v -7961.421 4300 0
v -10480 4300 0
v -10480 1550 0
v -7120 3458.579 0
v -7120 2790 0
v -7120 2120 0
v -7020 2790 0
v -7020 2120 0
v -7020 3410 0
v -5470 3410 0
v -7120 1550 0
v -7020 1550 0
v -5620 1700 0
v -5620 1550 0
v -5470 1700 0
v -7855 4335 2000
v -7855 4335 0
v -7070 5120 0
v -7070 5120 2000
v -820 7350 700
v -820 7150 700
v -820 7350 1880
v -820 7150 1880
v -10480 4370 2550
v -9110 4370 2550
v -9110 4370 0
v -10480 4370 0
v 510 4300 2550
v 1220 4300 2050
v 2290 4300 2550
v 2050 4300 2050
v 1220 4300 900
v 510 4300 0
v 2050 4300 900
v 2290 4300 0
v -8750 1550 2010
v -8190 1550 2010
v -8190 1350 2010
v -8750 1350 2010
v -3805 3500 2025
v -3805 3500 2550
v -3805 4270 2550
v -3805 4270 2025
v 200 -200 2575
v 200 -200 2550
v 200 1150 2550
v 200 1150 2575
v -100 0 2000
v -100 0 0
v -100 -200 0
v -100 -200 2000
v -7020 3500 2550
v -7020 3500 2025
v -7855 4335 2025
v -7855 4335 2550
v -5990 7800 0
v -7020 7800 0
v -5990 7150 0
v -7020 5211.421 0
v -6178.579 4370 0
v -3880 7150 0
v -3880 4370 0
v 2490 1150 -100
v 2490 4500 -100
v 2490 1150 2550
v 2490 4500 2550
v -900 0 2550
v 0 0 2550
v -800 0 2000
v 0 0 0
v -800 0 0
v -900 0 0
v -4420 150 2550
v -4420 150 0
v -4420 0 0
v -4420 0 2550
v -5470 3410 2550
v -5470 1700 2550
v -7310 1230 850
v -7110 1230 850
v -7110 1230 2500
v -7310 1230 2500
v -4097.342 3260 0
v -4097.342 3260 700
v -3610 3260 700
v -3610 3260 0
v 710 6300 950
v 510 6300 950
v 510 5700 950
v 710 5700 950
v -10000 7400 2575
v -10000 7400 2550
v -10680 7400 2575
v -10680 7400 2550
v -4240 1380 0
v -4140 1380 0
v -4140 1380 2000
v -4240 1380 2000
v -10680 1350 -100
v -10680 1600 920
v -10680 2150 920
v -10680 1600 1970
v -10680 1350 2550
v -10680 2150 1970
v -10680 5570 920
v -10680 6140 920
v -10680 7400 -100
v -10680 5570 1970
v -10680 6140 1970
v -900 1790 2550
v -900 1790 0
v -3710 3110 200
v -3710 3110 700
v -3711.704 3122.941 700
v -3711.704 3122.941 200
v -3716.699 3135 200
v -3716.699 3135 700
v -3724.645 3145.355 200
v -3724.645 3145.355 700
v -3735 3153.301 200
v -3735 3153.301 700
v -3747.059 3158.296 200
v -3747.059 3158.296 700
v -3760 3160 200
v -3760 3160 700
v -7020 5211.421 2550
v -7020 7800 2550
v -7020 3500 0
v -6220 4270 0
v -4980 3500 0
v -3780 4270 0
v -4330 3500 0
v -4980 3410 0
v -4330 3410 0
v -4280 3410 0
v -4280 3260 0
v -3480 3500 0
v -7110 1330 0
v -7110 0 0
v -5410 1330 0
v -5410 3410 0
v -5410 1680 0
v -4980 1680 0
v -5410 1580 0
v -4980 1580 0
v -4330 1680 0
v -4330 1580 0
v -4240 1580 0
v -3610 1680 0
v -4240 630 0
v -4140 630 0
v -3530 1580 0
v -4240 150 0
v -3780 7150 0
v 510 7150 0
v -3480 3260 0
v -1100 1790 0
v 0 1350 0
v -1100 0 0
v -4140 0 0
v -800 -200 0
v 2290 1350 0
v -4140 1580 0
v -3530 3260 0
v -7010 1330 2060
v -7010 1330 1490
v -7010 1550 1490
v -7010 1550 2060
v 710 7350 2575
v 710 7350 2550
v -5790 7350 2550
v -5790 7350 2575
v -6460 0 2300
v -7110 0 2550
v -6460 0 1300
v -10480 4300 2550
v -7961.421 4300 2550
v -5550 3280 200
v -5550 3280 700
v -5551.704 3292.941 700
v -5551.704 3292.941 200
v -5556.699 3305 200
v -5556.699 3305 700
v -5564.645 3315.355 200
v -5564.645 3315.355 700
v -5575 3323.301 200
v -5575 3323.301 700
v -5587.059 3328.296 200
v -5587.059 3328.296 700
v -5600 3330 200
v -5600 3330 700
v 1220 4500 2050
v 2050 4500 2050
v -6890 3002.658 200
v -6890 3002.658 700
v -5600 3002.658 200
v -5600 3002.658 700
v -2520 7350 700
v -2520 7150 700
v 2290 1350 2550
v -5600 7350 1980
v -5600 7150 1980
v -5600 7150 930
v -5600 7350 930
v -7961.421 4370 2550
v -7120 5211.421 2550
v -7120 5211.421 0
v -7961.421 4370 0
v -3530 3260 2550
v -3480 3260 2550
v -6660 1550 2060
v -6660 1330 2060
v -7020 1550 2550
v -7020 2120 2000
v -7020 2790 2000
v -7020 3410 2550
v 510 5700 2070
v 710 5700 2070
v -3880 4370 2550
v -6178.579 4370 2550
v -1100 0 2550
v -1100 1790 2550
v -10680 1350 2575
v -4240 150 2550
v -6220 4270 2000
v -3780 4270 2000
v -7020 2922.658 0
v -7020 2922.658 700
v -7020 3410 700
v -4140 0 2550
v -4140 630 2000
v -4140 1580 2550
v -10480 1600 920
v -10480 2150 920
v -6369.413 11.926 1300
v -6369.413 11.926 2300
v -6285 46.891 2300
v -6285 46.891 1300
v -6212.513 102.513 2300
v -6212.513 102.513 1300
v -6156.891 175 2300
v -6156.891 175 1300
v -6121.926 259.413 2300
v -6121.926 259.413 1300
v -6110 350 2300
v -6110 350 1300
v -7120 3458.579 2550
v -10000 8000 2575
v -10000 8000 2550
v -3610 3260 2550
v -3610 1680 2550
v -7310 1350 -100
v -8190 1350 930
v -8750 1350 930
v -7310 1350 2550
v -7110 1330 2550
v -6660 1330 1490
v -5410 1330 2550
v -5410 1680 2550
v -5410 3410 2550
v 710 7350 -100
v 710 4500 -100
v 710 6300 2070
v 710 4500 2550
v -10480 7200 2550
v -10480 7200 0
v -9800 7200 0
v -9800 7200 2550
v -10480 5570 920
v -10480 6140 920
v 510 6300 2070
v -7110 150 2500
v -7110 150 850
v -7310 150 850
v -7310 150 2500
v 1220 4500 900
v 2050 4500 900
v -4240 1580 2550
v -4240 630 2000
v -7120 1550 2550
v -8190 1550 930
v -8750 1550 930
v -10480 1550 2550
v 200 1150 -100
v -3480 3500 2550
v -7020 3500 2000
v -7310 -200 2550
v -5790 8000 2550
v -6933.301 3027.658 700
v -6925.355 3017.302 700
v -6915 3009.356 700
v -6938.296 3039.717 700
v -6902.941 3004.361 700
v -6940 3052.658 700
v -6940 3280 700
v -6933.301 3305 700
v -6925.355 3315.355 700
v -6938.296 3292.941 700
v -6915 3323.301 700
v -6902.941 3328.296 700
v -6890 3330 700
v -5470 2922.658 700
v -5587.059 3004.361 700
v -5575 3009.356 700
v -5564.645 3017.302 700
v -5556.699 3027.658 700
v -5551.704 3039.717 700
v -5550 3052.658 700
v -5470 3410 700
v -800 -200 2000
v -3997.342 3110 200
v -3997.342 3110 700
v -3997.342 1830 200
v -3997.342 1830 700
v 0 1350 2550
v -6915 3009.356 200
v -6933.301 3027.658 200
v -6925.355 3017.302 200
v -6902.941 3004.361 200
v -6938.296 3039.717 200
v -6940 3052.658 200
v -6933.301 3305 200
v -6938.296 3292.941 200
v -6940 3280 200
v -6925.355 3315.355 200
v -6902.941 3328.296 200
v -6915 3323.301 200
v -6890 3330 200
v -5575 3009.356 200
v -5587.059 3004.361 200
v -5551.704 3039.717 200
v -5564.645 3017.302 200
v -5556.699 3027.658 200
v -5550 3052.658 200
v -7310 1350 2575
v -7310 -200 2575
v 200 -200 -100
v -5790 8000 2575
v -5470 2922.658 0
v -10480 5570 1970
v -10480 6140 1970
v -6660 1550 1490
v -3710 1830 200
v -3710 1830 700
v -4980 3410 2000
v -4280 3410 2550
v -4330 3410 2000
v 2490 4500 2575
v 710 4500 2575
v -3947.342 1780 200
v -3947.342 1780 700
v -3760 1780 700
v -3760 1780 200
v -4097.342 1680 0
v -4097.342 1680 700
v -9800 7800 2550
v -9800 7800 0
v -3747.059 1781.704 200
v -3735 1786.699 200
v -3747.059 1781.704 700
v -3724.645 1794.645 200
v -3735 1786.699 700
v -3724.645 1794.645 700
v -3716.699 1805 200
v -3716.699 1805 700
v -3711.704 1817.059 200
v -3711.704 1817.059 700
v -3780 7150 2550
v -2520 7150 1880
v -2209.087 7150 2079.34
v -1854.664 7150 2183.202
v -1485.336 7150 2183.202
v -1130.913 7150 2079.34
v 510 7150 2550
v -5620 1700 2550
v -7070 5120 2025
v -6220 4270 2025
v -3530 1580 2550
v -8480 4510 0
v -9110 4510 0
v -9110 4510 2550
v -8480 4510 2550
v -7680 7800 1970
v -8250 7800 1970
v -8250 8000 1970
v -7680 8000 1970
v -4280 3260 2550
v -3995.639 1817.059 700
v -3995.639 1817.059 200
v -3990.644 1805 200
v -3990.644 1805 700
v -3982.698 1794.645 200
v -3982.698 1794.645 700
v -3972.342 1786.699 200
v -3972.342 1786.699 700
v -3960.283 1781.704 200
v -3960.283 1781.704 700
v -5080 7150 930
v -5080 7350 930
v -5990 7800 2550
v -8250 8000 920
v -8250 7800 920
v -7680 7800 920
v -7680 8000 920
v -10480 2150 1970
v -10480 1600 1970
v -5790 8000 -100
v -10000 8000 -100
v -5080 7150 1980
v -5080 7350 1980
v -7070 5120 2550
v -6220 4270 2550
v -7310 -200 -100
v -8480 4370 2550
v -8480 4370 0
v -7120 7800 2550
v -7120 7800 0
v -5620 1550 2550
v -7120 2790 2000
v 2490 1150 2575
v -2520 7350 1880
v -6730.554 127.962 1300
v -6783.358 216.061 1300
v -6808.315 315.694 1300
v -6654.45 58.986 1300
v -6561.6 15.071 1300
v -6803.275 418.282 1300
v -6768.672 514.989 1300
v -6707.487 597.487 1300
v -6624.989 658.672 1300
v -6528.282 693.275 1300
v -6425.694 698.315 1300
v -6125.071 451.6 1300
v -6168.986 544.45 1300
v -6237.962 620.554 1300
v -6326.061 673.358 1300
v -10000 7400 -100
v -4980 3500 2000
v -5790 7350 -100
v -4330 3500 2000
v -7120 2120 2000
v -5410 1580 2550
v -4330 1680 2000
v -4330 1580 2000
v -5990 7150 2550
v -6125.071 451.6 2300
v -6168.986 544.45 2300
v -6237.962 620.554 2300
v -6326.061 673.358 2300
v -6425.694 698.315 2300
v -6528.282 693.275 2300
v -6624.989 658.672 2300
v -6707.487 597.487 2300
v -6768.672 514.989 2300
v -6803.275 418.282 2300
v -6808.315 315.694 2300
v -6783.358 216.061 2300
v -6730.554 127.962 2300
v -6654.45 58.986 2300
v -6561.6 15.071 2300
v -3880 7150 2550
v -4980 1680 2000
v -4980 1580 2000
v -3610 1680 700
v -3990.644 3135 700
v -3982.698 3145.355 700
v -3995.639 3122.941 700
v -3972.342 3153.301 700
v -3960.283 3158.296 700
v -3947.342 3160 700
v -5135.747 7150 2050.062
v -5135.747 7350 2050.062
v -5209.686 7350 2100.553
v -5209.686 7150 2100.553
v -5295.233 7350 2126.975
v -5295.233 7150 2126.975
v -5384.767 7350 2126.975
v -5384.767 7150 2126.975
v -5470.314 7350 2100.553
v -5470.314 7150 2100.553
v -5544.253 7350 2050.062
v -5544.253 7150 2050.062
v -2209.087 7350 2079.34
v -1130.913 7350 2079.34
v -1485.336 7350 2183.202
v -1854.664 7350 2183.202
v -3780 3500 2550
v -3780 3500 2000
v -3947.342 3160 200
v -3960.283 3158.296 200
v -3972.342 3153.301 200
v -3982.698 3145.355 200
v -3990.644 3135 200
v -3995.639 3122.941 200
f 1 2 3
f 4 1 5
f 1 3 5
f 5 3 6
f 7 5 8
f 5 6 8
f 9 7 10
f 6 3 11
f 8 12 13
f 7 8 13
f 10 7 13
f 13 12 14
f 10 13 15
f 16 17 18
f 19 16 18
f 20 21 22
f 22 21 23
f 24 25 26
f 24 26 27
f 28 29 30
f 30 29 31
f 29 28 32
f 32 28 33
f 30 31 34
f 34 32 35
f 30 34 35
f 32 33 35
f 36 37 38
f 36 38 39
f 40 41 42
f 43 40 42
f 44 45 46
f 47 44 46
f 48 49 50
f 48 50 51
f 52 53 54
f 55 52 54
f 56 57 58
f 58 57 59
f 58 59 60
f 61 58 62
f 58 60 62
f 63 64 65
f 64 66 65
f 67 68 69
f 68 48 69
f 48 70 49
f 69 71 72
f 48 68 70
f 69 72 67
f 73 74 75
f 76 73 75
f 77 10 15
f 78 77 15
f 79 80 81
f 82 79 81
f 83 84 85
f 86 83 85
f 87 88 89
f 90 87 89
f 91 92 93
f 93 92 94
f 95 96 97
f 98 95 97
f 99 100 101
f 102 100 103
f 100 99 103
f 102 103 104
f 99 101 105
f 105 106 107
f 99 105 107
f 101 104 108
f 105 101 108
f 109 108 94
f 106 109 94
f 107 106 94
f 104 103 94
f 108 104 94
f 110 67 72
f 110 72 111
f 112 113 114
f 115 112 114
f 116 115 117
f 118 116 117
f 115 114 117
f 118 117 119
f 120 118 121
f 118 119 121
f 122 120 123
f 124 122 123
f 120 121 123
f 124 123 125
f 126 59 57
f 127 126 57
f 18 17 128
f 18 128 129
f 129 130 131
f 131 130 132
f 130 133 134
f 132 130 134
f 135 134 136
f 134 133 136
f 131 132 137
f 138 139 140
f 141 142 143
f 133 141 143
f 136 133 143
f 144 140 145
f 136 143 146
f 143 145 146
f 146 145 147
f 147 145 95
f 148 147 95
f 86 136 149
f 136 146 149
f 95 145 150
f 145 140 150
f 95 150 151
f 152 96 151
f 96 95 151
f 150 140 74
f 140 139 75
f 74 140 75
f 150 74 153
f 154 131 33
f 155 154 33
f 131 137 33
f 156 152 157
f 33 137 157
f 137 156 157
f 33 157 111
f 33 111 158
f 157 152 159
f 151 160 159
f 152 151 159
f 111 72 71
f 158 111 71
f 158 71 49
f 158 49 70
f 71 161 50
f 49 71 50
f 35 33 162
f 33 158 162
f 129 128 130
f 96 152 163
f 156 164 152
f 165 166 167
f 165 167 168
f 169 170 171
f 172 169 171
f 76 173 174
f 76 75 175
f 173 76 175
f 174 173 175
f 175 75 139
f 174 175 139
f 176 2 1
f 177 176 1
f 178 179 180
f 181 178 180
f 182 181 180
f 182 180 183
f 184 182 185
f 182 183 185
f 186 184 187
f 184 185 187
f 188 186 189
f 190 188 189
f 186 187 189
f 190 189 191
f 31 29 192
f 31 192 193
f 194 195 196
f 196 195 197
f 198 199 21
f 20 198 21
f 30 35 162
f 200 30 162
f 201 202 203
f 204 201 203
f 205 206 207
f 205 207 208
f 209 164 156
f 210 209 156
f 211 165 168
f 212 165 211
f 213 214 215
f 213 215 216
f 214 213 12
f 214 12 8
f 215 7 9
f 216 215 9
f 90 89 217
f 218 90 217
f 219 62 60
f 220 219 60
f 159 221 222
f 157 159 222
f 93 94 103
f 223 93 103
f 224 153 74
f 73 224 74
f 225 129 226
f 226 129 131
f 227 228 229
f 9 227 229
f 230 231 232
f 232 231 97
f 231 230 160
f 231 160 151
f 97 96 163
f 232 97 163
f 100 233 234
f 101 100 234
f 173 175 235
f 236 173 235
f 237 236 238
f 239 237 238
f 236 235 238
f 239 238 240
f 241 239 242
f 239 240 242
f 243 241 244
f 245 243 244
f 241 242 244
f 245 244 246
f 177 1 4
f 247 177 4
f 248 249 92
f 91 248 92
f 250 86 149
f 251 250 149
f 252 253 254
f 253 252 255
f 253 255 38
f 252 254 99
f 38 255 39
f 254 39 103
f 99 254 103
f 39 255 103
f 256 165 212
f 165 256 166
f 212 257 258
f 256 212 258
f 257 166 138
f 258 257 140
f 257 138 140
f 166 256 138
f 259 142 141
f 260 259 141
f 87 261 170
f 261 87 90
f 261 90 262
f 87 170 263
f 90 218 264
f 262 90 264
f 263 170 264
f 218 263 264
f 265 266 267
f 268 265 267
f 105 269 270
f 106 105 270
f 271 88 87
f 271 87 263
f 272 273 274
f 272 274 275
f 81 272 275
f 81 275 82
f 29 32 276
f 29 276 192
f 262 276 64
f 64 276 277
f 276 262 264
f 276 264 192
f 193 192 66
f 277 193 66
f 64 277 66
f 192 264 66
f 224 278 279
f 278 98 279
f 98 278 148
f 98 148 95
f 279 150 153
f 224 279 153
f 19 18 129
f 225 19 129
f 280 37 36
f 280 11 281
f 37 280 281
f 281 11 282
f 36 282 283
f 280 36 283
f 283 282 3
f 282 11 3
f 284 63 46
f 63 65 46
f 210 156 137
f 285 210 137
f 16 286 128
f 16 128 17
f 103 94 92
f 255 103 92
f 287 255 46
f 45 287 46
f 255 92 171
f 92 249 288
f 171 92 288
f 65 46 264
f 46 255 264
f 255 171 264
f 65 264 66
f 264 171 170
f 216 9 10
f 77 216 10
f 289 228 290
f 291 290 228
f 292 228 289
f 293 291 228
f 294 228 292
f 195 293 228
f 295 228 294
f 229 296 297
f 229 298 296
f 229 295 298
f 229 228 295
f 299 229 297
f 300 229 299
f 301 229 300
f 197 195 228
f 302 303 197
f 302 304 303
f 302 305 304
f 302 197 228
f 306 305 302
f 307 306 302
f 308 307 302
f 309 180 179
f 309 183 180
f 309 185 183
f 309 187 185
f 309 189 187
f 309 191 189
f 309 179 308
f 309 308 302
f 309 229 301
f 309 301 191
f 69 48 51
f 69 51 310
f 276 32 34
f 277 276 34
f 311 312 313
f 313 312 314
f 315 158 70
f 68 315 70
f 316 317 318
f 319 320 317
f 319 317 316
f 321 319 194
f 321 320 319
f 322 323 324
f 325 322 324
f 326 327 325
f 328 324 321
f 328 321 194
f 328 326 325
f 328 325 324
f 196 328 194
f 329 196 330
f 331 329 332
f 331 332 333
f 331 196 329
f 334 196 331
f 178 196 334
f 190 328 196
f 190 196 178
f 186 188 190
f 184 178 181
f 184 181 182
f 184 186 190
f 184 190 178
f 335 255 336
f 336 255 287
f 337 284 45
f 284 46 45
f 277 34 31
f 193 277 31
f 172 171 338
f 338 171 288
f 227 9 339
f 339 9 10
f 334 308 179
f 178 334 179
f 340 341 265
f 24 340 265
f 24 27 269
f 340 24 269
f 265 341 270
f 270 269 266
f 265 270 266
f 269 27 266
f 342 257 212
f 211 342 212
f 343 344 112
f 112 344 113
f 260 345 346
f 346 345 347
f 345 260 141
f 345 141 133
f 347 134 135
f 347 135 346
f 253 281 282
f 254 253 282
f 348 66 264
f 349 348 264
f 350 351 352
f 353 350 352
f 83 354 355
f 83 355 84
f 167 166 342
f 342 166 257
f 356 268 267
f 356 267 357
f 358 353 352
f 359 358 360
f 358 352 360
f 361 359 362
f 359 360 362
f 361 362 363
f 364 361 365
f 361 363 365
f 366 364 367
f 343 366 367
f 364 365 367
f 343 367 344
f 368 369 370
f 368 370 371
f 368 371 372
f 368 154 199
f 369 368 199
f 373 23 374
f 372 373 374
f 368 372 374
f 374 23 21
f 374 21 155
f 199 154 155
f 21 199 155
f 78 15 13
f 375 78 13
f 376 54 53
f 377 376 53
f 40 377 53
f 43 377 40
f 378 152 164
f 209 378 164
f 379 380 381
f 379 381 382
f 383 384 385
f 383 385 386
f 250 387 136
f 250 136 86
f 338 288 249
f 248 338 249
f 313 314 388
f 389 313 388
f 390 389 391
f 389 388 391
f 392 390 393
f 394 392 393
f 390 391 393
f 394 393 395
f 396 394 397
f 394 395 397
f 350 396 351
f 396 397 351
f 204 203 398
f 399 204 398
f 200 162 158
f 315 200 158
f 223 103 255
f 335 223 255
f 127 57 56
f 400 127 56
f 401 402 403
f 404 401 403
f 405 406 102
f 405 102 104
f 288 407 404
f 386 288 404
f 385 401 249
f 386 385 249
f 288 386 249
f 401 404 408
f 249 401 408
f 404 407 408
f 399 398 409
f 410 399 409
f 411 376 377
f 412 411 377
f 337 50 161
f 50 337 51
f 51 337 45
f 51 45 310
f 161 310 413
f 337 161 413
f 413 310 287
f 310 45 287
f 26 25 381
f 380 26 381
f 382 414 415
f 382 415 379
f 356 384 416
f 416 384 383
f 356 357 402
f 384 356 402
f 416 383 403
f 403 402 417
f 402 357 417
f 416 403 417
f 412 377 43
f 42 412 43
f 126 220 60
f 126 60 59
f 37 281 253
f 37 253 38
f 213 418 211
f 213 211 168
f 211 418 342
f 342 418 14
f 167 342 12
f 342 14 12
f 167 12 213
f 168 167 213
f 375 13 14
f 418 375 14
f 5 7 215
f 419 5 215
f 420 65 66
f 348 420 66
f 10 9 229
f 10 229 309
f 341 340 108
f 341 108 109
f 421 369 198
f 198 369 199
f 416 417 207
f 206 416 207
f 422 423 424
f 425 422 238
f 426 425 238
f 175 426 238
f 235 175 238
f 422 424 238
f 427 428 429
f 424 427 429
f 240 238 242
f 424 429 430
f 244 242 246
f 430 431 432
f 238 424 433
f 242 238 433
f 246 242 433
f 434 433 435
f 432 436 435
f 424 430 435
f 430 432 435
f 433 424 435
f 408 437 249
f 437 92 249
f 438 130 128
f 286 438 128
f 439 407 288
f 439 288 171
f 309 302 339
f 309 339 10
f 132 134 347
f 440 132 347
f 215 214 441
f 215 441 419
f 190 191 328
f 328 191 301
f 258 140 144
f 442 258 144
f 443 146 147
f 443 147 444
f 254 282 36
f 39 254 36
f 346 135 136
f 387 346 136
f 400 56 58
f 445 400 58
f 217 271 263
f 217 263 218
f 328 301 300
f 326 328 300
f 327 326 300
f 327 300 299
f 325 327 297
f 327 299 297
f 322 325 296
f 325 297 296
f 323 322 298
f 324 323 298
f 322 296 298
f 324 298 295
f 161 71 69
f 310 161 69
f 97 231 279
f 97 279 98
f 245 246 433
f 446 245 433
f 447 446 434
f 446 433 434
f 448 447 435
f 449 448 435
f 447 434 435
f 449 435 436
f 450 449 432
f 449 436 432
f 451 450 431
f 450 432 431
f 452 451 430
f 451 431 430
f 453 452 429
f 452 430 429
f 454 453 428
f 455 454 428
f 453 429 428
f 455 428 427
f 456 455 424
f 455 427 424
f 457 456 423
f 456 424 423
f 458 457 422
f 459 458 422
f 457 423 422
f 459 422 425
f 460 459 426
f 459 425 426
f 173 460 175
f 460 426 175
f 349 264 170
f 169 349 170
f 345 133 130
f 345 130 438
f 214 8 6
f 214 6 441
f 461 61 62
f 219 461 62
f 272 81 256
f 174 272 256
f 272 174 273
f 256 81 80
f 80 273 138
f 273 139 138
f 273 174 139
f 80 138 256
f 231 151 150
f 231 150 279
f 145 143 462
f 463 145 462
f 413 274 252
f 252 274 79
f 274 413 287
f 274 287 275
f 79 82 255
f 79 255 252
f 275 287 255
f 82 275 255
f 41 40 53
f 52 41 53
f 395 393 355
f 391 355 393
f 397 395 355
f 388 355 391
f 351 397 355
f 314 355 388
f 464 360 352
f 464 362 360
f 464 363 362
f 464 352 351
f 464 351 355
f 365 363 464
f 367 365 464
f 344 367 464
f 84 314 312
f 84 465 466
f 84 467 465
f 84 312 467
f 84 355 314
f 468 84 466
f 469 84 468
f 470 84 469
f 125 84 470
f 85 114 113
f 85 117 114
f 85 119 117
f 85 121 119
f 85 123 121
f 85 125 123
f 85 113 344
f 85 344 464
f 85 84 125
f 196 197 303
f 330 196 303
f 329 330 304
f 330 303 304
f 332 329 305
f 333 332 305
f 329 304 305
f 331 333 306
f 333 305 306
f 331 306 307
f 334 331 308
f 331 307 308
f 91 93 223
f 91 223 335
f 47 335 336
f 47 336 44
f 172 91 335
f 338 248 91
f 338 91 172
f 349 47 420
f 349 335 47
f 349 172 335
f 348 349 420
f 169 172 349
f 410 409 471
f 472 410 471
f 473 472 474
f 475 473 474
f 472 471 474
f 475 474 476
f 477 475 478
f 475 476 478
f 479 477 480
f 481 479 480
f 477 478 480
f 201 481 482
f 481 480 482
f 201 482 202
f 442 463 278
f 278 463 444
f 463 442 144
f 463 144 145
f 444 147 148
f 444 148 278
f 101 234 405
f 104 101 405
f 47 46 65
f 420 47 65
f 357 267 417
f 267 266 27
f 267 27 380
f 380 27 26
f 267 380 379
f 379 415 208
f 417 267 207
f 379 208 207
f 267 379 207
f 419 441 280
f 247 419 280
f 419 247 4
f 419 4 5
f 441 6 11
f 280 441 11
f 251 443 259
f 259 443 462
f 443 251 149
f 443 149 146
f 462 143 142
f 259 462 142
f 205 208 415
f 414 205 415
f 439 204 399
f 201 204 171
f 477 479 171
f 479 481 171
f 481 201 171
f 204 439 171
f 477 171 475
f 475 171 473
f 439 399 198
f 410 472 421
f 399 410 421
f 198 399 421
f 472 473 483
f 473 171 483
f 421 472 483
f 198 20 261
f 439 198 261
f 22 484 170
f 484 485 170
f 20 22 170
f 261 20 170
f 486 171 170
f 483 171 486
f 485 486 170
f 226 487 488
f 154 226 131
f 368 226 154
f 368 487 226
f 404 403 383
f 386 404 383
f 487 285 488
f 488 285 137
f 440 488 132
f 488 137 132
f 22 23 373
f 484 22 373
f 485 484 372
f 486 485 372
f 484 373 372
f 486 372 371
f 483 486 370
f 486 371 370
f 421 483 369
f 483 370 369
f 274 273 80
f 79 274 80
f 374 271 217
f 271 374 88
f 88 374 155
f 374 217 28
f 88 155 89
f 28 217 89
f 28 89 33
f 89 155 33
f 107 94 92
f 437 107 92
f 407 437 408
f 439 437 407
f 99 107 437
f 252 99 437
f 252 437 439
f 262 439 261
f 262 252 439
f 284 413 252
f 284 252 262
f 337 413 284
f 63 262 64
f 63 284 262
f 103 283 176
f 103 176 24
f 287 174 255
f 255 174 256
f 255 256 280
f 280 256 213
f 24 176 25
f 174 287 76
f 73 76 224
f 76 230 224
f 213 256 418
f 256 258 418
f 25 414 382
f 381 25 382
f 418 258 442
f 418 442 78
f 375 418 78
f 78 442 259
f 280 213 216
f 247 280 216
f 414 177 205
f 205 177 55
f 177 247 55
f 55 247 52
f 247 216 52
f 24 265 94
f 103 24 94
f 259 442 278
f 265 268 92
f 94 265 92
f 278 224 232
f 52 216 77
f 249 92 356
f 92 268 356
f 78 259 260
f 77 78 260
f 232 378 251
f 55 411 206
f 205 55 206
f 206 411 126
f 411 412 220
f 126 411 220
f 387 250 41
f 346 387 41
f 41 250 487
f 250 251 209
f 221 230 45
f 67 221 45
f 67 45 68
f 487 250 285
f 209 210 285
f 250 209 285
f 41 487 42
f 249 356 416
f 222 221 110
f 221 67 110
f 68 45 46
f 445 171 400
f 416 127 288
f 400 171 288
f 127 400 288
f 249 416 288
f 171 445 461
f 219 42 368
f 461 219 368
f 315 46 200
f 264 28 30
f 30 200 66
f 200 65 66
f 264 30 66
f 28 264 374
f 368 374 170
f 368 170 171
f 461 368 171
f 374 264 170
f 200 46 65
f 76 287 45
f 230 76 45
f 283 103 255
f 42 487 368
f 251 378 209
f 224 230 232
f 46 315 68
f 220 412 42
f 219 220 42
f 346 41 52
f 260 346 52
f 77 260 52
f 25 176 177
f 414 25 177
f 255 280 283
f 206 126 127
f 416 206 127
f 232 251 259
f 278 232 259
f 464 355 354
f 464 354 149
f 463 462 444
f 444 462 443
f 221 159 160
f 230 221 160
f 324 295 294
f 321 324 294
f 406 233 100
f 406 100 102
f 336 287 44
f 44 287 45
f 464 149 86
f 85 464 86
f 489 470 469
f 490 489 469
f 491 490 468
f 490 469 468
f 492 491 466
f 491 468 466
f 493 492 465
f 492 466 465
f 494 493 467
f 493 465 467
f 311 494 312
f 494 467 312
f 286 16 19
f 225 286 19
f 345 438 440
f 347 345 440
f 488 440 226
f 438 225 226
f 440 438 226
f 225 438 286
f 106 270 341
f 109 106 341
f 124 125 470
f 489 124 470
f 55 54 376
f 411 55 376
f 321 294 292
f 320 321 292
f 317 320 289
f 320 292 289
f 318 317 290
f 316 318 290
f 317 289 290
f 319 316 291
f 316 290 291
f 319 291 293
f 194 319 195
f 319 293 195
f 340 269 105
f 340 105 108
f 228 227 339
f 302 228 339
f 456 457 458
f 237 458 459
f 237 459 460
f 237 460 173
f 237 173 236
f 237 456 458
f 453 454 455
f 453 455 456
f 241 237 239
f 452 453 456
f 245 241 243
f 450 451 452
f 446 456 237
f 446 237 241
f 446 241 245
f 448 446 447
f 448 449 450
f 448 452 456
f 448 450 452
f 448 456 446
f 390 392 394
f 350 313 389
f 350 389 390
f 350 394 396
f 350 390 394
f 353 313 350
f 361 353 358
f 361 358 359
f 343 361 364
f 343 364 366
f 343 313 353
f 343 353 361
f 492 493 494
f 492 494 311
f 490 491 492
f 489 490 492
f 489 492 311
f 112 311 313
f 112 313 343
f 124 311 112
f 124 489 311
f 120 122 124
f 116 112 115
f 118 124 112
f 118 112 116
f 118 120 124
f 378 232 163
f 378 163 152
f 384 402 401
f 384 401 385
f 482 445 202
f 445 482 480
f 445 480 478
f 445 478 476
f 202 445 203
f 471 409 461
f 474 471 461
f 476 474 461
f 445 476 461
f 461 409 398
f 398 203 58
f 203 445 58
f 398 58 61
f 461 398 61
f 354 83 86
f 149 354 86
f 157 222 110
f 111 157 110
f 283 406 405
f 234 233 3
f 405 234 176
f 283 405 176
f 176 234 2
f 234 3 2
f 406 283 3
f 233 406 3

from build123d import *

# Parameters (mm, degrees)
F1_DEPTH       = 2550
F3_DEPTH       = 100
F4_W           = 630
F4_H           = 140
F4_W_2         = 200
F4_H_2         = 1790
F5_DEPTH       = 2550
F6_W           = 830
F6_H           = 1150
F7_DEPTH       = 3700.001
F8_W           = 600
F8_H           = 1120
F9_DEPTH       = 200
F11_DEPTH      = 200
F13_DEPTH      = 200
F14_W          = 570
F14_H          = 1050
F15_DEPTH      = 200
F16_W          = 570
F16_H          = 1050
F17_DEPTH      = 200
F18_W          = 550
F18_H          = 1050
F19_DEPTH      = 200
F20_W          = 560
F20_H          = 1080
F21_DEPTH      = 200
F22_W          = 1080
F22_H          = 1650
F23_DEPTH      = 200
F24_W          = 350
F24_H          = 570
F25_DEPTH      = 220
F26_W          = 670
F26_H          = 2000
F27_DEPTH      = 100
F28_W          = 650
F28_H          = 2000
F29_DEPTH      = 90
F29_DEPTH_BACK = 1830
F30_W          = 700
F30_H          = 2000
F31_DEPTH      = 200
F32_W          = 750
F32_H          = 2000
F33_DEPTH      = 100
F36_DEPTH      = 25
F37_W          = 770
F37_H          = 525
F38_DEPTH      = 25
F40_DEPTH      = 25
F42_R          = 350
F43_DEPTH      = 1000
F44_W          = 487.3422718048
F44_H          = 1580
F45_DEPTH      = 700
F44_W_2        = 1550
F44_H_2        = 487.3422718048
F47_DEPTH      = 500
F49_DEPTH      = 500


with BuildPart() as f1:
    # F0 (on Top) → F1 (new body)
    with BuildSketch(Plane.XY):
        Polygon((710, 7350), (-5790, 7350), (-5790, 8000), (-10000, 8000), (-10000, 7400), (-10680, 7400), (-10680, 1350), (-7310, 1350), (-7310, -200), (200, -200), (200, 1150), (2490, 1150), (2490, 4500), (710, 4500), align=None)
        Polygon((0, 1350), (0, 0), (-7110, 0), (-7110, 1550), (-10480, 1550), (-10480, 7200), (-9800, 7200), (-9800, 7800), (-5990, 7800), (-5990, 7150), (510, 7150), (510, 4300), (2290, 4300), (2290, 1350), align=None, mode=Mode.SUBTRACT)
    extrude(amount=F1_DEPTH)

    # F2 (on face) → F3 (join)
    with BuildSketch(Plane(origin=(0, 0, 0), x_dir=(1, 0, 0), z_dir=(0, 0, -1))):
        Polygon((-10680, -7400), (-10000, -7400), (-10000, -8000), (-5790, -8000), (-5790, -7350), (710, -7350), (710, -4500), (2490, -4500), (2490, -1150), (200, -1150), (200, 200), (-7310, 200), (-7310, -1350), (-10680, -1350), align=None)
    extrude(amount=F3_DEPTH)

    # F4 (on Top) → F5 (join)
    with BuildSketch(Plane.XY):
        Polygon((-7120, 3458.5786437627), (-7120, 1550), (-7110, 1550), (-7110, 1330), (-5410, 1330), (-5410, 1550), (-5410, 1580), (-4240, 1580), (-4140, 1580), (-3530, 1580), (-3530, 1680), (-3530, 3260), (-3480, 3260), (-3480, 3500), (-7020, 3500), (-7855, 4335), (-7070, 5120), (-6220, 4270), (-3780, 4270), (-3780, 7350), (-3880, 7350), (-3880, 4370), (-6178.5786437627, 4370), (-7020, 5211.4213562373), (-7020, 8000), (-7120, 8000), (-7120, 5211.4213562373), (-7961.4213562373, 4370), (-8480, 4370), (-9110, 4370), (-10680, 4370), (-10680, 4300), (-7961.4213562373, 4300), align=None)
        Polygon((-7020, 3410), (-5470, 3410), (-5470, 1700), (-5620, 1700), (-5620, 1550), (-7020, 1550), align=None, mode=Mode.SUBTRACT)
        Polygon((-3610, 3260), (-3610, 1680), (-5410, 1680), (-5410, 3410), (-4280, 3410), (-4280, 3260), align=None, mode=Mode.SUBTRACT)
        with Locations((-8795, 4440)):
            Rectangle(F4_W, F4_H)
        Polygon((-4140, 1580), (-4240, 1580), (-4240, 150), (-4420, 150), (-4420, 0), (-4140, 0), align=None)
        with Locations((-1000, 895)):
            Rectangle(F4_W_2, F4_H_2)
    extrude(amount=F5_DEPTH)

    # F6 (on face) → F7 (cut, through all)
    with BuildSketch(Plane.XZ.offset(-4300)):
        with Locations((1635, 1475)):
            Rectangle(F6_W, F6_H)
    extrude(amount=-F7_DEPTH, mode=Mode.SUBTRACT)

    # F8 (on face) → F9 (cut, through all)
    with BuildSketch(Plane(origin=(510, 0, 0), x_dir=(0, -1, 0), z_dir=(-1, 0, 0))):
        with Locations((-6000, 1510)):
            Rectangle(F8_W, F8_H)
    extrude(amount=-F9_DEPTH, mode=Mode.SUBTRACT)

    # F10 (on face) → F11 (cut, through all)
    with BuildSketch(Plane.XZ.offset(-7150)):
        with BuildLine():
            Line((-2520, 1880), (-2520, 700))
            Line((-2520, 700), (-820, 700))
            Line((-820, 700), (-820, 1880))
            ThreePointArc((-820, 1880), (-1670, 2196.3842213547), (-2520, 1880))
        make_face()
    extrude(amount=-F11_DEPTH, mode=Mode.SUBTRACT)

    # F12 (on face) → F13 (cut, through all)
    with BuildSketch(Plane.XZ.offset(-7150)):
        with BuildLine():
            Line((-5600, 1980), (-5600, 930))
            Line((-5600, 930), (-5080, 930))
            Line((-5080, 930), (-5080, 1980))
            ThreePointArc((-5080, 1980), (-5340, 2130.333704529), (-5600, 1980))
        make_face()
    extrude(amount=-F13_DEPTH, mode=Mode.SUBTRACT)

    # F14 (on face) → F15 (cut, through all)
    with BuildSketch(Plane.XZ.offset(-7800)):
        with Locations((-7965, 1445)):
            Rectangle(F14_W, F14_H)
    extrude(amount=-F15_DEPTH, mode=Mode.SUBTRACT)

    # F16 (on face) → F17 (cut, through all)
    with BuildSketch(Plane.YZ.offset(-10480)):
        with Locations((5855, 1445)):
            Rectangle(F16_W, F16_H)
    extrude(amount=-F17_DEPTH, mode=Mode.SUBTRACT)

    # F18 (on face) → F19 (cut, through all)
    with BuildSketch(Plane.YZ.offset(-10480)):
        with Locations((1875, 1445)):
            Rectangle(F18_W, F18_H)
    extrude(amount=-F19_DEPTH, mode=Mode.SUBTRACT)

    # F20 (on face) → F21 (cut, through all)
    with BuildSketch(Plane(origin=(0, 1550, 0), x_dir=(-1, 0, 0), z_dir=(0, 1, 0))):
        with Locations((8470, 1470)):
            Rectangle(F20_W, F20_H)
    extrude(amount=-F21_DEPTH, mode=Mode.SUBTRACT)

    # F22 (on face) → F23 (cut, through all)
    with BuildSketch(Plane.YZ.offset(-7110)):
        with Locations((690, 1675)):
            Rectangle(F22_W, F22_H)
    extrude(amount=-F23_DEPTH, mode=Mode.SUBTRACT)

    # F24 (on face) → F25 (cut, through all)
    with BuildSketch(Plane.XZ.offset(-1330)):
        with Locations((-6835, 1775)):
            Rectangle(F24_W, F24_H)
    extrude(amount=-F25_DEPTH, mode=Mode.SUBTRACT)

    # F26 (on face) → F27 (cut, through all)
    with BuildSketch(Plane.YZ.offset(-7020)):
        with Locations((2455, 1000)):
            Rectangle(F26_W, F26_H)
    extrude(amount=-F27_DEPTH, mode=Mode.SUBTRACT)

    # F28 (on face) → F29 (cut, two sides)
    with BuildSketch(Plane.XZ.offset(-3410)) as f29_sk:
        with Locations((-4655, 1000)):
            Rectangle(F28_W, F28_H)
    extrude(amount=-F29_DEPTH, mode=Mode.SUBTRACT)
    extrude(f29_sk.sketch, amount=F29_DEPTH_BACK, mode=Mode.SUBTRACT)

    # F30 (on face) → F31 (cut, through all)
    with BuildSketch(Plane(origin=(0, 0, 0), x_dir=(-1, 0, 0), z_dir=(0, 1, 0))):
        with Locations((450, 1000)):
            Rectangle(F30_W, F30_H)
    extrude(amount=-F31_DEPTH, mode=Mode.SUBTRACT)

    # F32 (on face) → F33 (cut, through all)
    with BuildSketch(Plane.YZ.offset(-4140)):
        with Locations((1005, 1000)):
            Rectangle(F32_W, F32_H)
    extrude(amount=-F33_DEPTH, mode=Mode.SUBTRACT)

    # F35 (on offset) → F36 (join)
    with BuildSketch(Plane.XY.offset(2000)):
        Polygon((-3780, 4270), (-6220, 4270), (-7070, 5120), (-7855, 4335), (-7020, 3500), (-3780, 3500), align=None)
    extrude(amount=F36_DEPTH)

    # F37 (on face) → F38 (join)
    with BuildSketch(Plane.YZ.offset(-3780)):
        with Locations((3885, 2287.5)):
            Rectangle(F37_W, F37_H)
    extrude(amount=-F38_DEPTH)

    # F42 (on offset) → F43 (join)
    with BuildSketch(Plane.XY.offset(1300)):
        with Locations((-6460, 350)):
            Circle(F42_R)
    extrude(amount=F43_DEPTH)


with BuildPart() as f40:
    # F39 (on face) → F40 (new body)
    with BuildSketch(Plane.XY.offset(2550)):
        Polygon((-7310, 1350), (-7310, -200), (200, -200), (200, 1150), (2490, 1150), (2490, 4500), (710, 4500), (710, 7350), (-5790, 7350), (-5790, 8000), (-10000, 8000), (-10000, 7400), (-10680, 7400), (-10680, 1350), align=None)
    extrude(amount=F40_DEPTH)


with BuildPart() as f45:
    # F44 (on face) → F45 (new body)
    with BuildSketch(Plane.XY):
        with Locations((-3853.6711359024, 2470)):
            Rectangle(F44_W, F44_H)
    extrude(amount=F45_DEPTH)

    # F46 (on face) → F47 (cut)
    with BuildSketch(Plane.XY.offset(700)):
        with BuildLine():
            ThreePointArc((-3760, 1780), (-3724.6446609407, 1794.6446609407), (-3710, 1830))
            Line((-3710, 1830), (-3710, 3110))
            ThreePointArc((-3710, 3110), (-3724.6446609407, 3145.3553390593), (-3760, 3160))
            Line((-3760, 3160), (-3947.3422718048, 3160))
            ThreePointArc((-3947.3422718048, 3160), (-3982.6976108641, 3145.3553390593), (-3997.3422718048, 3110))
            Line((-3997.3422718048, 3110), (-3997.3422718048, 1830))
            ThreePointArc((-3997.3422718048, 1830), (-3982.6976108641, 1794.6446609407), (-3947.3422718048, 1780))
            Line((-3947.3422718048, 1780), (-3760, 1780))
        make_face()
    extrude(amount=-F47_DEPTH, mode=Mode.SUBTRACT)


with BuildPart() as f45b:
    # F44 (on face) → F45, piece 2 (new body)
    with BuildSketch(Plane.XY):
        with Locations((-6245, 3166.3288640976)):
            Rectangle(F44_W_2, F44_H_2)
    extrude(amount=F45_DEPTH)

    # F48 (on face) → F49 (cut)
    with BuildSketch(Plane.XY.offset(700)):
        with BuildLine():
            ThreePointArc((-5550, 3280), (-5564.6446609407, 3315.3553390593), (-5600, 3330))
            Line((-5600, 3330), (-6890, 3330))
            ThreePointArc((-6890, 3330), (-6925.3553390593, 3315.3553390593), (-6940, 3280))
            Line((-6940, 3280), (-6940, 3052.6577281952))
            ThreePointArc((-6940, 3052.6577281952), (-6925.3553390593, 3017.3023891359), (-6890, 3002.6577281952))
            Line((-6890, 3002.6577281952), (-5600, 3002.6577281952))
            ThreePointArc((-5600, 3002.6577281952), (-5564.6446609407, 3017.3023891359), (-5550, 3052.6577281952))
            Line((-5550, 3052.6577281952), (-5550, 3280))
        make_face()
    extrude(amount=-F49_DEPTH, mode=Mode.SUBTRACT)


solid = Compound([f1.part, f40.part, f45.part, f45b.part])
